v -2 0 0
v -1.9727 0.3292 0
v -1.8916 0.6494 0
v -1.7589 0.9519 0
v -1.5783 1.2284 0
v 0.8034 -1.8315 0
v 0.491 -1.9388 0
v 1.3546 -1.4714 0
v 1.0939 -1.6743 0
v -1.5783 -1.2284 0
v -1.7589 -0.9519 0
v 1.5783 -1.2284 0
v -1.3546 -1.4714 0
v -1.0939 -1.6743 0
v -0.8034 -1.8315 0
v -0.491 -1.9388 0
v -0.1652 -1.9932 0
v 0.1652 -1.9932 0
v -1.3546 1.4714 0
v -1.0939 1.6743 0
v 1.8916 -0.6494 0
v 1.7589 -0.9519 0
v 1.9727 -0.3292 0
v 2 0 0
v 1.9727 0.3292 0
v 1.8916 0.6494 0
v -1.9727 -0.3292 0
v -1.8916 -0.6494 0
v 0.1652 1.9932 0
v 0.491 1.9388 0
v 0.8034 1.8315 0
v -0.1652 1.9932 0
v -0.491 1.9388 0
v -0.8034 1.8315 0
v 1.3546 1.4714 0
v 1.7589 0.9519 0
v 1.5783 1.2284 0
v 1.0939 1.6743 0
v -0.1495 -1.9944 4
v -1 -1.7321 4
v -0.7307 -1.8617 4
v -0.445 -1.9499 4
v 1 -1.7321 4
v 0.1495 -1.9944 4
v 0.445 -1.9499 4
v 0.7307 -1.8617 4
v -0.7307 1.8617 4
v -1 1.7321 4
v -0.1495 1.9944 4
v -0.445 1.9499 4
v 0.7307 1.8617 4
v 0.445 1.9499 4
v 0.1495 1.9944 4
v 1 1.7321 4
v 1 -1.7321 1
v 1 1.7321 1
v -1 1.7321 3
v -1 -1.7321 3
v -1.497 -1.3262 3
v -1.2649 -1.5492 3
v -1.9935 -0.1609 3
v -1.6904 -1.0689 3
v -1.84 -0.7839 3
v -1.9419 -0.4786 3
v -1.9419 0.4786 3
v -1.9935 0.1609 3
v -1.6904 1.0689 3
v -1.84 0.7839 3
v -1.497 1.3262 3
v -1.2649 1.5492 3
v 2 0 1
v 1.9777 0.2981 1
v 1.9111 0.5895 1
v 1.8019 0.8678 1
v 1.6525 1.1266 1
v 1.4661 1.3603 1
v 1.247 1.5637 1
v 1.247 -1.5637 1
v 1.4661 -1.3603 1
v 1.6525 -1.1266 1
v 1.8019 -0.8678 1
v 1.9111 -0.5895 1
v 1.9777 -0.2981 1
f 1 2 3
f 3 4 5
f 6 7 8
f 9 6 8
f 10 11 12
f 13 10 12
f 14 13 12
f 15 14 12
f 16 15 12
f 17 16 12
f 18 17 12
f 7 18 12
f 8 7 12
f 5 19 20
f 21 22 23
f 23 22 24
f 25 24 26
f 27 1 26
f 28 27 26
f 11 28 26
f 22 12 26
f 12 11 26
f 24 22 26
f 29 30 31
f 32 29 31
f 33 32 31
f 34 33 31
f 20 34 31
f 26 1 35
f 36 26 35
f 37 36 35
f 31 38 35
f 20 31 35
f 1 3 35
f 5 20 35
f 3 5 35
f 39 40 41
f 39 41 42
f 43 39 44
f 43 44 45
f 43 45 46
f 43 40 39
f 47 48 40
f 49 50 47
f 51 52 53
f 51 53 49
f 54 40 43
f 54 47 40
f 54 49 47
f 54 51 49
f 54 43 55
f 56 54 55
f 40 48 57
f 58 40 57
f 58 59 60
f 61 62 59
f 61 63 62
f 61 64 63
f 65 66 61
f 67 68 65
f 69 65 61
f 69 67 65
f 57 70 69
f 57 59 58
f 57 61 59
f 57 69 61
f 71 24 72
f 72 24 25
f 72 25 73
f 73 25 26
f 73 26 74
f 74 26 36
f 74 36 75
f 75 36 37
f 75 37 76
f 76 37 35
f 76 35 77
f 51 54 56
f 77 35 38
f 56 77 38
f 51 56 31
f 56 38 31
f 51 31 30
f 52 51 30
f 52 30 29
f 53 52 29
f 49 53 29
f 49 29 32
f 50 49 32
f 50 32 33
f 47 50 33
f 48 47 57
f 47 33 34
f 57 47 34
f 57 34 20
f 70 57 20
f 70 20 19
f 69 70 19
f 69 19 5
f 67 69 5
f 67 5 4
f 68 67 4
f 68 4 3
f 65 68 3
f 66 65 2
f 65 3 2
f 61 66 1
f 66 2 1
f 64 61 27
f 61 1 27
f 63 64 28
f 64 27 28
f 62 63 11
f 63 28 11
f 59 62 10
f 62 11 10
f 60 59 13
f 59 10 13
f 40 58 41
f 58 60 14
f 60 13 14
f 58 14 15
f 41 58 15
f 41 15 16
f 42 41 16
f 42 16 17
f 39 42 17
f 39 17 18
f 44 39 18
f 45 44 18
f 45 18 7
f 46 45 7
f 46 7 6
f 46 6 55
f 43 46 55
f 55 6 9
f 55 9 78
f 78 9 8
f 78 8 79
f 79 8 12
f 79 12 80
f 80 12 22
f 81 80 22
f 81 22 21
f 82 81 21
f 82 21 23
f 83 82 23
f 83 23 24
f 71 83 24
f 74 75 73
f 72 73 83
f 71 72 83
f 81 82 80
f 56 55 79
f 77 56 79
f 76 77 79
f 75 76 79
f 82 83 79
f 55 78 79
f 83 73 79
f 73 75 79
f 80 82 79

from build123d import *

# Parameters (mm, degrees)
SKETCH1_R           = 2
BOSS_EXTRUDE1_DEPTH = 4
SKETCH2_W           = 1
SKETCH2_H           = 3
SKETCH2_H_2         = 1
CUT_EXTRUDE1_DEPTH  = 5


with BuildPart() as part:
    # Sketch1 → Boss-Extrude1 (new body)
    with BuildSketch(Plane.XY):
        Circle(SKETCH1_R)
    extrude(amount=BOSS_EXTRUDE1_DEPTH)

    # Sketch2 → Cut-Extrude1 (cut, symmetric)
    with BuildSketch(Plane(origin=(0, 0, 0), x_dir=(1, 0, 0), z_dir=(0, 1, 0))):
        with Locations((1.5, -2.5)):
            Rectangle(SKETCH2_W, SKETCH2_H)
        with Locations((-1.5, -3.5)):
            Rectangle(SKETCH2_W, SKETCH2_H_2)
    extrude(amount=CUT_EXTRUDE1_DEPTH, both=True, mode=Mode.SUBTRACT)


solid = part.part
